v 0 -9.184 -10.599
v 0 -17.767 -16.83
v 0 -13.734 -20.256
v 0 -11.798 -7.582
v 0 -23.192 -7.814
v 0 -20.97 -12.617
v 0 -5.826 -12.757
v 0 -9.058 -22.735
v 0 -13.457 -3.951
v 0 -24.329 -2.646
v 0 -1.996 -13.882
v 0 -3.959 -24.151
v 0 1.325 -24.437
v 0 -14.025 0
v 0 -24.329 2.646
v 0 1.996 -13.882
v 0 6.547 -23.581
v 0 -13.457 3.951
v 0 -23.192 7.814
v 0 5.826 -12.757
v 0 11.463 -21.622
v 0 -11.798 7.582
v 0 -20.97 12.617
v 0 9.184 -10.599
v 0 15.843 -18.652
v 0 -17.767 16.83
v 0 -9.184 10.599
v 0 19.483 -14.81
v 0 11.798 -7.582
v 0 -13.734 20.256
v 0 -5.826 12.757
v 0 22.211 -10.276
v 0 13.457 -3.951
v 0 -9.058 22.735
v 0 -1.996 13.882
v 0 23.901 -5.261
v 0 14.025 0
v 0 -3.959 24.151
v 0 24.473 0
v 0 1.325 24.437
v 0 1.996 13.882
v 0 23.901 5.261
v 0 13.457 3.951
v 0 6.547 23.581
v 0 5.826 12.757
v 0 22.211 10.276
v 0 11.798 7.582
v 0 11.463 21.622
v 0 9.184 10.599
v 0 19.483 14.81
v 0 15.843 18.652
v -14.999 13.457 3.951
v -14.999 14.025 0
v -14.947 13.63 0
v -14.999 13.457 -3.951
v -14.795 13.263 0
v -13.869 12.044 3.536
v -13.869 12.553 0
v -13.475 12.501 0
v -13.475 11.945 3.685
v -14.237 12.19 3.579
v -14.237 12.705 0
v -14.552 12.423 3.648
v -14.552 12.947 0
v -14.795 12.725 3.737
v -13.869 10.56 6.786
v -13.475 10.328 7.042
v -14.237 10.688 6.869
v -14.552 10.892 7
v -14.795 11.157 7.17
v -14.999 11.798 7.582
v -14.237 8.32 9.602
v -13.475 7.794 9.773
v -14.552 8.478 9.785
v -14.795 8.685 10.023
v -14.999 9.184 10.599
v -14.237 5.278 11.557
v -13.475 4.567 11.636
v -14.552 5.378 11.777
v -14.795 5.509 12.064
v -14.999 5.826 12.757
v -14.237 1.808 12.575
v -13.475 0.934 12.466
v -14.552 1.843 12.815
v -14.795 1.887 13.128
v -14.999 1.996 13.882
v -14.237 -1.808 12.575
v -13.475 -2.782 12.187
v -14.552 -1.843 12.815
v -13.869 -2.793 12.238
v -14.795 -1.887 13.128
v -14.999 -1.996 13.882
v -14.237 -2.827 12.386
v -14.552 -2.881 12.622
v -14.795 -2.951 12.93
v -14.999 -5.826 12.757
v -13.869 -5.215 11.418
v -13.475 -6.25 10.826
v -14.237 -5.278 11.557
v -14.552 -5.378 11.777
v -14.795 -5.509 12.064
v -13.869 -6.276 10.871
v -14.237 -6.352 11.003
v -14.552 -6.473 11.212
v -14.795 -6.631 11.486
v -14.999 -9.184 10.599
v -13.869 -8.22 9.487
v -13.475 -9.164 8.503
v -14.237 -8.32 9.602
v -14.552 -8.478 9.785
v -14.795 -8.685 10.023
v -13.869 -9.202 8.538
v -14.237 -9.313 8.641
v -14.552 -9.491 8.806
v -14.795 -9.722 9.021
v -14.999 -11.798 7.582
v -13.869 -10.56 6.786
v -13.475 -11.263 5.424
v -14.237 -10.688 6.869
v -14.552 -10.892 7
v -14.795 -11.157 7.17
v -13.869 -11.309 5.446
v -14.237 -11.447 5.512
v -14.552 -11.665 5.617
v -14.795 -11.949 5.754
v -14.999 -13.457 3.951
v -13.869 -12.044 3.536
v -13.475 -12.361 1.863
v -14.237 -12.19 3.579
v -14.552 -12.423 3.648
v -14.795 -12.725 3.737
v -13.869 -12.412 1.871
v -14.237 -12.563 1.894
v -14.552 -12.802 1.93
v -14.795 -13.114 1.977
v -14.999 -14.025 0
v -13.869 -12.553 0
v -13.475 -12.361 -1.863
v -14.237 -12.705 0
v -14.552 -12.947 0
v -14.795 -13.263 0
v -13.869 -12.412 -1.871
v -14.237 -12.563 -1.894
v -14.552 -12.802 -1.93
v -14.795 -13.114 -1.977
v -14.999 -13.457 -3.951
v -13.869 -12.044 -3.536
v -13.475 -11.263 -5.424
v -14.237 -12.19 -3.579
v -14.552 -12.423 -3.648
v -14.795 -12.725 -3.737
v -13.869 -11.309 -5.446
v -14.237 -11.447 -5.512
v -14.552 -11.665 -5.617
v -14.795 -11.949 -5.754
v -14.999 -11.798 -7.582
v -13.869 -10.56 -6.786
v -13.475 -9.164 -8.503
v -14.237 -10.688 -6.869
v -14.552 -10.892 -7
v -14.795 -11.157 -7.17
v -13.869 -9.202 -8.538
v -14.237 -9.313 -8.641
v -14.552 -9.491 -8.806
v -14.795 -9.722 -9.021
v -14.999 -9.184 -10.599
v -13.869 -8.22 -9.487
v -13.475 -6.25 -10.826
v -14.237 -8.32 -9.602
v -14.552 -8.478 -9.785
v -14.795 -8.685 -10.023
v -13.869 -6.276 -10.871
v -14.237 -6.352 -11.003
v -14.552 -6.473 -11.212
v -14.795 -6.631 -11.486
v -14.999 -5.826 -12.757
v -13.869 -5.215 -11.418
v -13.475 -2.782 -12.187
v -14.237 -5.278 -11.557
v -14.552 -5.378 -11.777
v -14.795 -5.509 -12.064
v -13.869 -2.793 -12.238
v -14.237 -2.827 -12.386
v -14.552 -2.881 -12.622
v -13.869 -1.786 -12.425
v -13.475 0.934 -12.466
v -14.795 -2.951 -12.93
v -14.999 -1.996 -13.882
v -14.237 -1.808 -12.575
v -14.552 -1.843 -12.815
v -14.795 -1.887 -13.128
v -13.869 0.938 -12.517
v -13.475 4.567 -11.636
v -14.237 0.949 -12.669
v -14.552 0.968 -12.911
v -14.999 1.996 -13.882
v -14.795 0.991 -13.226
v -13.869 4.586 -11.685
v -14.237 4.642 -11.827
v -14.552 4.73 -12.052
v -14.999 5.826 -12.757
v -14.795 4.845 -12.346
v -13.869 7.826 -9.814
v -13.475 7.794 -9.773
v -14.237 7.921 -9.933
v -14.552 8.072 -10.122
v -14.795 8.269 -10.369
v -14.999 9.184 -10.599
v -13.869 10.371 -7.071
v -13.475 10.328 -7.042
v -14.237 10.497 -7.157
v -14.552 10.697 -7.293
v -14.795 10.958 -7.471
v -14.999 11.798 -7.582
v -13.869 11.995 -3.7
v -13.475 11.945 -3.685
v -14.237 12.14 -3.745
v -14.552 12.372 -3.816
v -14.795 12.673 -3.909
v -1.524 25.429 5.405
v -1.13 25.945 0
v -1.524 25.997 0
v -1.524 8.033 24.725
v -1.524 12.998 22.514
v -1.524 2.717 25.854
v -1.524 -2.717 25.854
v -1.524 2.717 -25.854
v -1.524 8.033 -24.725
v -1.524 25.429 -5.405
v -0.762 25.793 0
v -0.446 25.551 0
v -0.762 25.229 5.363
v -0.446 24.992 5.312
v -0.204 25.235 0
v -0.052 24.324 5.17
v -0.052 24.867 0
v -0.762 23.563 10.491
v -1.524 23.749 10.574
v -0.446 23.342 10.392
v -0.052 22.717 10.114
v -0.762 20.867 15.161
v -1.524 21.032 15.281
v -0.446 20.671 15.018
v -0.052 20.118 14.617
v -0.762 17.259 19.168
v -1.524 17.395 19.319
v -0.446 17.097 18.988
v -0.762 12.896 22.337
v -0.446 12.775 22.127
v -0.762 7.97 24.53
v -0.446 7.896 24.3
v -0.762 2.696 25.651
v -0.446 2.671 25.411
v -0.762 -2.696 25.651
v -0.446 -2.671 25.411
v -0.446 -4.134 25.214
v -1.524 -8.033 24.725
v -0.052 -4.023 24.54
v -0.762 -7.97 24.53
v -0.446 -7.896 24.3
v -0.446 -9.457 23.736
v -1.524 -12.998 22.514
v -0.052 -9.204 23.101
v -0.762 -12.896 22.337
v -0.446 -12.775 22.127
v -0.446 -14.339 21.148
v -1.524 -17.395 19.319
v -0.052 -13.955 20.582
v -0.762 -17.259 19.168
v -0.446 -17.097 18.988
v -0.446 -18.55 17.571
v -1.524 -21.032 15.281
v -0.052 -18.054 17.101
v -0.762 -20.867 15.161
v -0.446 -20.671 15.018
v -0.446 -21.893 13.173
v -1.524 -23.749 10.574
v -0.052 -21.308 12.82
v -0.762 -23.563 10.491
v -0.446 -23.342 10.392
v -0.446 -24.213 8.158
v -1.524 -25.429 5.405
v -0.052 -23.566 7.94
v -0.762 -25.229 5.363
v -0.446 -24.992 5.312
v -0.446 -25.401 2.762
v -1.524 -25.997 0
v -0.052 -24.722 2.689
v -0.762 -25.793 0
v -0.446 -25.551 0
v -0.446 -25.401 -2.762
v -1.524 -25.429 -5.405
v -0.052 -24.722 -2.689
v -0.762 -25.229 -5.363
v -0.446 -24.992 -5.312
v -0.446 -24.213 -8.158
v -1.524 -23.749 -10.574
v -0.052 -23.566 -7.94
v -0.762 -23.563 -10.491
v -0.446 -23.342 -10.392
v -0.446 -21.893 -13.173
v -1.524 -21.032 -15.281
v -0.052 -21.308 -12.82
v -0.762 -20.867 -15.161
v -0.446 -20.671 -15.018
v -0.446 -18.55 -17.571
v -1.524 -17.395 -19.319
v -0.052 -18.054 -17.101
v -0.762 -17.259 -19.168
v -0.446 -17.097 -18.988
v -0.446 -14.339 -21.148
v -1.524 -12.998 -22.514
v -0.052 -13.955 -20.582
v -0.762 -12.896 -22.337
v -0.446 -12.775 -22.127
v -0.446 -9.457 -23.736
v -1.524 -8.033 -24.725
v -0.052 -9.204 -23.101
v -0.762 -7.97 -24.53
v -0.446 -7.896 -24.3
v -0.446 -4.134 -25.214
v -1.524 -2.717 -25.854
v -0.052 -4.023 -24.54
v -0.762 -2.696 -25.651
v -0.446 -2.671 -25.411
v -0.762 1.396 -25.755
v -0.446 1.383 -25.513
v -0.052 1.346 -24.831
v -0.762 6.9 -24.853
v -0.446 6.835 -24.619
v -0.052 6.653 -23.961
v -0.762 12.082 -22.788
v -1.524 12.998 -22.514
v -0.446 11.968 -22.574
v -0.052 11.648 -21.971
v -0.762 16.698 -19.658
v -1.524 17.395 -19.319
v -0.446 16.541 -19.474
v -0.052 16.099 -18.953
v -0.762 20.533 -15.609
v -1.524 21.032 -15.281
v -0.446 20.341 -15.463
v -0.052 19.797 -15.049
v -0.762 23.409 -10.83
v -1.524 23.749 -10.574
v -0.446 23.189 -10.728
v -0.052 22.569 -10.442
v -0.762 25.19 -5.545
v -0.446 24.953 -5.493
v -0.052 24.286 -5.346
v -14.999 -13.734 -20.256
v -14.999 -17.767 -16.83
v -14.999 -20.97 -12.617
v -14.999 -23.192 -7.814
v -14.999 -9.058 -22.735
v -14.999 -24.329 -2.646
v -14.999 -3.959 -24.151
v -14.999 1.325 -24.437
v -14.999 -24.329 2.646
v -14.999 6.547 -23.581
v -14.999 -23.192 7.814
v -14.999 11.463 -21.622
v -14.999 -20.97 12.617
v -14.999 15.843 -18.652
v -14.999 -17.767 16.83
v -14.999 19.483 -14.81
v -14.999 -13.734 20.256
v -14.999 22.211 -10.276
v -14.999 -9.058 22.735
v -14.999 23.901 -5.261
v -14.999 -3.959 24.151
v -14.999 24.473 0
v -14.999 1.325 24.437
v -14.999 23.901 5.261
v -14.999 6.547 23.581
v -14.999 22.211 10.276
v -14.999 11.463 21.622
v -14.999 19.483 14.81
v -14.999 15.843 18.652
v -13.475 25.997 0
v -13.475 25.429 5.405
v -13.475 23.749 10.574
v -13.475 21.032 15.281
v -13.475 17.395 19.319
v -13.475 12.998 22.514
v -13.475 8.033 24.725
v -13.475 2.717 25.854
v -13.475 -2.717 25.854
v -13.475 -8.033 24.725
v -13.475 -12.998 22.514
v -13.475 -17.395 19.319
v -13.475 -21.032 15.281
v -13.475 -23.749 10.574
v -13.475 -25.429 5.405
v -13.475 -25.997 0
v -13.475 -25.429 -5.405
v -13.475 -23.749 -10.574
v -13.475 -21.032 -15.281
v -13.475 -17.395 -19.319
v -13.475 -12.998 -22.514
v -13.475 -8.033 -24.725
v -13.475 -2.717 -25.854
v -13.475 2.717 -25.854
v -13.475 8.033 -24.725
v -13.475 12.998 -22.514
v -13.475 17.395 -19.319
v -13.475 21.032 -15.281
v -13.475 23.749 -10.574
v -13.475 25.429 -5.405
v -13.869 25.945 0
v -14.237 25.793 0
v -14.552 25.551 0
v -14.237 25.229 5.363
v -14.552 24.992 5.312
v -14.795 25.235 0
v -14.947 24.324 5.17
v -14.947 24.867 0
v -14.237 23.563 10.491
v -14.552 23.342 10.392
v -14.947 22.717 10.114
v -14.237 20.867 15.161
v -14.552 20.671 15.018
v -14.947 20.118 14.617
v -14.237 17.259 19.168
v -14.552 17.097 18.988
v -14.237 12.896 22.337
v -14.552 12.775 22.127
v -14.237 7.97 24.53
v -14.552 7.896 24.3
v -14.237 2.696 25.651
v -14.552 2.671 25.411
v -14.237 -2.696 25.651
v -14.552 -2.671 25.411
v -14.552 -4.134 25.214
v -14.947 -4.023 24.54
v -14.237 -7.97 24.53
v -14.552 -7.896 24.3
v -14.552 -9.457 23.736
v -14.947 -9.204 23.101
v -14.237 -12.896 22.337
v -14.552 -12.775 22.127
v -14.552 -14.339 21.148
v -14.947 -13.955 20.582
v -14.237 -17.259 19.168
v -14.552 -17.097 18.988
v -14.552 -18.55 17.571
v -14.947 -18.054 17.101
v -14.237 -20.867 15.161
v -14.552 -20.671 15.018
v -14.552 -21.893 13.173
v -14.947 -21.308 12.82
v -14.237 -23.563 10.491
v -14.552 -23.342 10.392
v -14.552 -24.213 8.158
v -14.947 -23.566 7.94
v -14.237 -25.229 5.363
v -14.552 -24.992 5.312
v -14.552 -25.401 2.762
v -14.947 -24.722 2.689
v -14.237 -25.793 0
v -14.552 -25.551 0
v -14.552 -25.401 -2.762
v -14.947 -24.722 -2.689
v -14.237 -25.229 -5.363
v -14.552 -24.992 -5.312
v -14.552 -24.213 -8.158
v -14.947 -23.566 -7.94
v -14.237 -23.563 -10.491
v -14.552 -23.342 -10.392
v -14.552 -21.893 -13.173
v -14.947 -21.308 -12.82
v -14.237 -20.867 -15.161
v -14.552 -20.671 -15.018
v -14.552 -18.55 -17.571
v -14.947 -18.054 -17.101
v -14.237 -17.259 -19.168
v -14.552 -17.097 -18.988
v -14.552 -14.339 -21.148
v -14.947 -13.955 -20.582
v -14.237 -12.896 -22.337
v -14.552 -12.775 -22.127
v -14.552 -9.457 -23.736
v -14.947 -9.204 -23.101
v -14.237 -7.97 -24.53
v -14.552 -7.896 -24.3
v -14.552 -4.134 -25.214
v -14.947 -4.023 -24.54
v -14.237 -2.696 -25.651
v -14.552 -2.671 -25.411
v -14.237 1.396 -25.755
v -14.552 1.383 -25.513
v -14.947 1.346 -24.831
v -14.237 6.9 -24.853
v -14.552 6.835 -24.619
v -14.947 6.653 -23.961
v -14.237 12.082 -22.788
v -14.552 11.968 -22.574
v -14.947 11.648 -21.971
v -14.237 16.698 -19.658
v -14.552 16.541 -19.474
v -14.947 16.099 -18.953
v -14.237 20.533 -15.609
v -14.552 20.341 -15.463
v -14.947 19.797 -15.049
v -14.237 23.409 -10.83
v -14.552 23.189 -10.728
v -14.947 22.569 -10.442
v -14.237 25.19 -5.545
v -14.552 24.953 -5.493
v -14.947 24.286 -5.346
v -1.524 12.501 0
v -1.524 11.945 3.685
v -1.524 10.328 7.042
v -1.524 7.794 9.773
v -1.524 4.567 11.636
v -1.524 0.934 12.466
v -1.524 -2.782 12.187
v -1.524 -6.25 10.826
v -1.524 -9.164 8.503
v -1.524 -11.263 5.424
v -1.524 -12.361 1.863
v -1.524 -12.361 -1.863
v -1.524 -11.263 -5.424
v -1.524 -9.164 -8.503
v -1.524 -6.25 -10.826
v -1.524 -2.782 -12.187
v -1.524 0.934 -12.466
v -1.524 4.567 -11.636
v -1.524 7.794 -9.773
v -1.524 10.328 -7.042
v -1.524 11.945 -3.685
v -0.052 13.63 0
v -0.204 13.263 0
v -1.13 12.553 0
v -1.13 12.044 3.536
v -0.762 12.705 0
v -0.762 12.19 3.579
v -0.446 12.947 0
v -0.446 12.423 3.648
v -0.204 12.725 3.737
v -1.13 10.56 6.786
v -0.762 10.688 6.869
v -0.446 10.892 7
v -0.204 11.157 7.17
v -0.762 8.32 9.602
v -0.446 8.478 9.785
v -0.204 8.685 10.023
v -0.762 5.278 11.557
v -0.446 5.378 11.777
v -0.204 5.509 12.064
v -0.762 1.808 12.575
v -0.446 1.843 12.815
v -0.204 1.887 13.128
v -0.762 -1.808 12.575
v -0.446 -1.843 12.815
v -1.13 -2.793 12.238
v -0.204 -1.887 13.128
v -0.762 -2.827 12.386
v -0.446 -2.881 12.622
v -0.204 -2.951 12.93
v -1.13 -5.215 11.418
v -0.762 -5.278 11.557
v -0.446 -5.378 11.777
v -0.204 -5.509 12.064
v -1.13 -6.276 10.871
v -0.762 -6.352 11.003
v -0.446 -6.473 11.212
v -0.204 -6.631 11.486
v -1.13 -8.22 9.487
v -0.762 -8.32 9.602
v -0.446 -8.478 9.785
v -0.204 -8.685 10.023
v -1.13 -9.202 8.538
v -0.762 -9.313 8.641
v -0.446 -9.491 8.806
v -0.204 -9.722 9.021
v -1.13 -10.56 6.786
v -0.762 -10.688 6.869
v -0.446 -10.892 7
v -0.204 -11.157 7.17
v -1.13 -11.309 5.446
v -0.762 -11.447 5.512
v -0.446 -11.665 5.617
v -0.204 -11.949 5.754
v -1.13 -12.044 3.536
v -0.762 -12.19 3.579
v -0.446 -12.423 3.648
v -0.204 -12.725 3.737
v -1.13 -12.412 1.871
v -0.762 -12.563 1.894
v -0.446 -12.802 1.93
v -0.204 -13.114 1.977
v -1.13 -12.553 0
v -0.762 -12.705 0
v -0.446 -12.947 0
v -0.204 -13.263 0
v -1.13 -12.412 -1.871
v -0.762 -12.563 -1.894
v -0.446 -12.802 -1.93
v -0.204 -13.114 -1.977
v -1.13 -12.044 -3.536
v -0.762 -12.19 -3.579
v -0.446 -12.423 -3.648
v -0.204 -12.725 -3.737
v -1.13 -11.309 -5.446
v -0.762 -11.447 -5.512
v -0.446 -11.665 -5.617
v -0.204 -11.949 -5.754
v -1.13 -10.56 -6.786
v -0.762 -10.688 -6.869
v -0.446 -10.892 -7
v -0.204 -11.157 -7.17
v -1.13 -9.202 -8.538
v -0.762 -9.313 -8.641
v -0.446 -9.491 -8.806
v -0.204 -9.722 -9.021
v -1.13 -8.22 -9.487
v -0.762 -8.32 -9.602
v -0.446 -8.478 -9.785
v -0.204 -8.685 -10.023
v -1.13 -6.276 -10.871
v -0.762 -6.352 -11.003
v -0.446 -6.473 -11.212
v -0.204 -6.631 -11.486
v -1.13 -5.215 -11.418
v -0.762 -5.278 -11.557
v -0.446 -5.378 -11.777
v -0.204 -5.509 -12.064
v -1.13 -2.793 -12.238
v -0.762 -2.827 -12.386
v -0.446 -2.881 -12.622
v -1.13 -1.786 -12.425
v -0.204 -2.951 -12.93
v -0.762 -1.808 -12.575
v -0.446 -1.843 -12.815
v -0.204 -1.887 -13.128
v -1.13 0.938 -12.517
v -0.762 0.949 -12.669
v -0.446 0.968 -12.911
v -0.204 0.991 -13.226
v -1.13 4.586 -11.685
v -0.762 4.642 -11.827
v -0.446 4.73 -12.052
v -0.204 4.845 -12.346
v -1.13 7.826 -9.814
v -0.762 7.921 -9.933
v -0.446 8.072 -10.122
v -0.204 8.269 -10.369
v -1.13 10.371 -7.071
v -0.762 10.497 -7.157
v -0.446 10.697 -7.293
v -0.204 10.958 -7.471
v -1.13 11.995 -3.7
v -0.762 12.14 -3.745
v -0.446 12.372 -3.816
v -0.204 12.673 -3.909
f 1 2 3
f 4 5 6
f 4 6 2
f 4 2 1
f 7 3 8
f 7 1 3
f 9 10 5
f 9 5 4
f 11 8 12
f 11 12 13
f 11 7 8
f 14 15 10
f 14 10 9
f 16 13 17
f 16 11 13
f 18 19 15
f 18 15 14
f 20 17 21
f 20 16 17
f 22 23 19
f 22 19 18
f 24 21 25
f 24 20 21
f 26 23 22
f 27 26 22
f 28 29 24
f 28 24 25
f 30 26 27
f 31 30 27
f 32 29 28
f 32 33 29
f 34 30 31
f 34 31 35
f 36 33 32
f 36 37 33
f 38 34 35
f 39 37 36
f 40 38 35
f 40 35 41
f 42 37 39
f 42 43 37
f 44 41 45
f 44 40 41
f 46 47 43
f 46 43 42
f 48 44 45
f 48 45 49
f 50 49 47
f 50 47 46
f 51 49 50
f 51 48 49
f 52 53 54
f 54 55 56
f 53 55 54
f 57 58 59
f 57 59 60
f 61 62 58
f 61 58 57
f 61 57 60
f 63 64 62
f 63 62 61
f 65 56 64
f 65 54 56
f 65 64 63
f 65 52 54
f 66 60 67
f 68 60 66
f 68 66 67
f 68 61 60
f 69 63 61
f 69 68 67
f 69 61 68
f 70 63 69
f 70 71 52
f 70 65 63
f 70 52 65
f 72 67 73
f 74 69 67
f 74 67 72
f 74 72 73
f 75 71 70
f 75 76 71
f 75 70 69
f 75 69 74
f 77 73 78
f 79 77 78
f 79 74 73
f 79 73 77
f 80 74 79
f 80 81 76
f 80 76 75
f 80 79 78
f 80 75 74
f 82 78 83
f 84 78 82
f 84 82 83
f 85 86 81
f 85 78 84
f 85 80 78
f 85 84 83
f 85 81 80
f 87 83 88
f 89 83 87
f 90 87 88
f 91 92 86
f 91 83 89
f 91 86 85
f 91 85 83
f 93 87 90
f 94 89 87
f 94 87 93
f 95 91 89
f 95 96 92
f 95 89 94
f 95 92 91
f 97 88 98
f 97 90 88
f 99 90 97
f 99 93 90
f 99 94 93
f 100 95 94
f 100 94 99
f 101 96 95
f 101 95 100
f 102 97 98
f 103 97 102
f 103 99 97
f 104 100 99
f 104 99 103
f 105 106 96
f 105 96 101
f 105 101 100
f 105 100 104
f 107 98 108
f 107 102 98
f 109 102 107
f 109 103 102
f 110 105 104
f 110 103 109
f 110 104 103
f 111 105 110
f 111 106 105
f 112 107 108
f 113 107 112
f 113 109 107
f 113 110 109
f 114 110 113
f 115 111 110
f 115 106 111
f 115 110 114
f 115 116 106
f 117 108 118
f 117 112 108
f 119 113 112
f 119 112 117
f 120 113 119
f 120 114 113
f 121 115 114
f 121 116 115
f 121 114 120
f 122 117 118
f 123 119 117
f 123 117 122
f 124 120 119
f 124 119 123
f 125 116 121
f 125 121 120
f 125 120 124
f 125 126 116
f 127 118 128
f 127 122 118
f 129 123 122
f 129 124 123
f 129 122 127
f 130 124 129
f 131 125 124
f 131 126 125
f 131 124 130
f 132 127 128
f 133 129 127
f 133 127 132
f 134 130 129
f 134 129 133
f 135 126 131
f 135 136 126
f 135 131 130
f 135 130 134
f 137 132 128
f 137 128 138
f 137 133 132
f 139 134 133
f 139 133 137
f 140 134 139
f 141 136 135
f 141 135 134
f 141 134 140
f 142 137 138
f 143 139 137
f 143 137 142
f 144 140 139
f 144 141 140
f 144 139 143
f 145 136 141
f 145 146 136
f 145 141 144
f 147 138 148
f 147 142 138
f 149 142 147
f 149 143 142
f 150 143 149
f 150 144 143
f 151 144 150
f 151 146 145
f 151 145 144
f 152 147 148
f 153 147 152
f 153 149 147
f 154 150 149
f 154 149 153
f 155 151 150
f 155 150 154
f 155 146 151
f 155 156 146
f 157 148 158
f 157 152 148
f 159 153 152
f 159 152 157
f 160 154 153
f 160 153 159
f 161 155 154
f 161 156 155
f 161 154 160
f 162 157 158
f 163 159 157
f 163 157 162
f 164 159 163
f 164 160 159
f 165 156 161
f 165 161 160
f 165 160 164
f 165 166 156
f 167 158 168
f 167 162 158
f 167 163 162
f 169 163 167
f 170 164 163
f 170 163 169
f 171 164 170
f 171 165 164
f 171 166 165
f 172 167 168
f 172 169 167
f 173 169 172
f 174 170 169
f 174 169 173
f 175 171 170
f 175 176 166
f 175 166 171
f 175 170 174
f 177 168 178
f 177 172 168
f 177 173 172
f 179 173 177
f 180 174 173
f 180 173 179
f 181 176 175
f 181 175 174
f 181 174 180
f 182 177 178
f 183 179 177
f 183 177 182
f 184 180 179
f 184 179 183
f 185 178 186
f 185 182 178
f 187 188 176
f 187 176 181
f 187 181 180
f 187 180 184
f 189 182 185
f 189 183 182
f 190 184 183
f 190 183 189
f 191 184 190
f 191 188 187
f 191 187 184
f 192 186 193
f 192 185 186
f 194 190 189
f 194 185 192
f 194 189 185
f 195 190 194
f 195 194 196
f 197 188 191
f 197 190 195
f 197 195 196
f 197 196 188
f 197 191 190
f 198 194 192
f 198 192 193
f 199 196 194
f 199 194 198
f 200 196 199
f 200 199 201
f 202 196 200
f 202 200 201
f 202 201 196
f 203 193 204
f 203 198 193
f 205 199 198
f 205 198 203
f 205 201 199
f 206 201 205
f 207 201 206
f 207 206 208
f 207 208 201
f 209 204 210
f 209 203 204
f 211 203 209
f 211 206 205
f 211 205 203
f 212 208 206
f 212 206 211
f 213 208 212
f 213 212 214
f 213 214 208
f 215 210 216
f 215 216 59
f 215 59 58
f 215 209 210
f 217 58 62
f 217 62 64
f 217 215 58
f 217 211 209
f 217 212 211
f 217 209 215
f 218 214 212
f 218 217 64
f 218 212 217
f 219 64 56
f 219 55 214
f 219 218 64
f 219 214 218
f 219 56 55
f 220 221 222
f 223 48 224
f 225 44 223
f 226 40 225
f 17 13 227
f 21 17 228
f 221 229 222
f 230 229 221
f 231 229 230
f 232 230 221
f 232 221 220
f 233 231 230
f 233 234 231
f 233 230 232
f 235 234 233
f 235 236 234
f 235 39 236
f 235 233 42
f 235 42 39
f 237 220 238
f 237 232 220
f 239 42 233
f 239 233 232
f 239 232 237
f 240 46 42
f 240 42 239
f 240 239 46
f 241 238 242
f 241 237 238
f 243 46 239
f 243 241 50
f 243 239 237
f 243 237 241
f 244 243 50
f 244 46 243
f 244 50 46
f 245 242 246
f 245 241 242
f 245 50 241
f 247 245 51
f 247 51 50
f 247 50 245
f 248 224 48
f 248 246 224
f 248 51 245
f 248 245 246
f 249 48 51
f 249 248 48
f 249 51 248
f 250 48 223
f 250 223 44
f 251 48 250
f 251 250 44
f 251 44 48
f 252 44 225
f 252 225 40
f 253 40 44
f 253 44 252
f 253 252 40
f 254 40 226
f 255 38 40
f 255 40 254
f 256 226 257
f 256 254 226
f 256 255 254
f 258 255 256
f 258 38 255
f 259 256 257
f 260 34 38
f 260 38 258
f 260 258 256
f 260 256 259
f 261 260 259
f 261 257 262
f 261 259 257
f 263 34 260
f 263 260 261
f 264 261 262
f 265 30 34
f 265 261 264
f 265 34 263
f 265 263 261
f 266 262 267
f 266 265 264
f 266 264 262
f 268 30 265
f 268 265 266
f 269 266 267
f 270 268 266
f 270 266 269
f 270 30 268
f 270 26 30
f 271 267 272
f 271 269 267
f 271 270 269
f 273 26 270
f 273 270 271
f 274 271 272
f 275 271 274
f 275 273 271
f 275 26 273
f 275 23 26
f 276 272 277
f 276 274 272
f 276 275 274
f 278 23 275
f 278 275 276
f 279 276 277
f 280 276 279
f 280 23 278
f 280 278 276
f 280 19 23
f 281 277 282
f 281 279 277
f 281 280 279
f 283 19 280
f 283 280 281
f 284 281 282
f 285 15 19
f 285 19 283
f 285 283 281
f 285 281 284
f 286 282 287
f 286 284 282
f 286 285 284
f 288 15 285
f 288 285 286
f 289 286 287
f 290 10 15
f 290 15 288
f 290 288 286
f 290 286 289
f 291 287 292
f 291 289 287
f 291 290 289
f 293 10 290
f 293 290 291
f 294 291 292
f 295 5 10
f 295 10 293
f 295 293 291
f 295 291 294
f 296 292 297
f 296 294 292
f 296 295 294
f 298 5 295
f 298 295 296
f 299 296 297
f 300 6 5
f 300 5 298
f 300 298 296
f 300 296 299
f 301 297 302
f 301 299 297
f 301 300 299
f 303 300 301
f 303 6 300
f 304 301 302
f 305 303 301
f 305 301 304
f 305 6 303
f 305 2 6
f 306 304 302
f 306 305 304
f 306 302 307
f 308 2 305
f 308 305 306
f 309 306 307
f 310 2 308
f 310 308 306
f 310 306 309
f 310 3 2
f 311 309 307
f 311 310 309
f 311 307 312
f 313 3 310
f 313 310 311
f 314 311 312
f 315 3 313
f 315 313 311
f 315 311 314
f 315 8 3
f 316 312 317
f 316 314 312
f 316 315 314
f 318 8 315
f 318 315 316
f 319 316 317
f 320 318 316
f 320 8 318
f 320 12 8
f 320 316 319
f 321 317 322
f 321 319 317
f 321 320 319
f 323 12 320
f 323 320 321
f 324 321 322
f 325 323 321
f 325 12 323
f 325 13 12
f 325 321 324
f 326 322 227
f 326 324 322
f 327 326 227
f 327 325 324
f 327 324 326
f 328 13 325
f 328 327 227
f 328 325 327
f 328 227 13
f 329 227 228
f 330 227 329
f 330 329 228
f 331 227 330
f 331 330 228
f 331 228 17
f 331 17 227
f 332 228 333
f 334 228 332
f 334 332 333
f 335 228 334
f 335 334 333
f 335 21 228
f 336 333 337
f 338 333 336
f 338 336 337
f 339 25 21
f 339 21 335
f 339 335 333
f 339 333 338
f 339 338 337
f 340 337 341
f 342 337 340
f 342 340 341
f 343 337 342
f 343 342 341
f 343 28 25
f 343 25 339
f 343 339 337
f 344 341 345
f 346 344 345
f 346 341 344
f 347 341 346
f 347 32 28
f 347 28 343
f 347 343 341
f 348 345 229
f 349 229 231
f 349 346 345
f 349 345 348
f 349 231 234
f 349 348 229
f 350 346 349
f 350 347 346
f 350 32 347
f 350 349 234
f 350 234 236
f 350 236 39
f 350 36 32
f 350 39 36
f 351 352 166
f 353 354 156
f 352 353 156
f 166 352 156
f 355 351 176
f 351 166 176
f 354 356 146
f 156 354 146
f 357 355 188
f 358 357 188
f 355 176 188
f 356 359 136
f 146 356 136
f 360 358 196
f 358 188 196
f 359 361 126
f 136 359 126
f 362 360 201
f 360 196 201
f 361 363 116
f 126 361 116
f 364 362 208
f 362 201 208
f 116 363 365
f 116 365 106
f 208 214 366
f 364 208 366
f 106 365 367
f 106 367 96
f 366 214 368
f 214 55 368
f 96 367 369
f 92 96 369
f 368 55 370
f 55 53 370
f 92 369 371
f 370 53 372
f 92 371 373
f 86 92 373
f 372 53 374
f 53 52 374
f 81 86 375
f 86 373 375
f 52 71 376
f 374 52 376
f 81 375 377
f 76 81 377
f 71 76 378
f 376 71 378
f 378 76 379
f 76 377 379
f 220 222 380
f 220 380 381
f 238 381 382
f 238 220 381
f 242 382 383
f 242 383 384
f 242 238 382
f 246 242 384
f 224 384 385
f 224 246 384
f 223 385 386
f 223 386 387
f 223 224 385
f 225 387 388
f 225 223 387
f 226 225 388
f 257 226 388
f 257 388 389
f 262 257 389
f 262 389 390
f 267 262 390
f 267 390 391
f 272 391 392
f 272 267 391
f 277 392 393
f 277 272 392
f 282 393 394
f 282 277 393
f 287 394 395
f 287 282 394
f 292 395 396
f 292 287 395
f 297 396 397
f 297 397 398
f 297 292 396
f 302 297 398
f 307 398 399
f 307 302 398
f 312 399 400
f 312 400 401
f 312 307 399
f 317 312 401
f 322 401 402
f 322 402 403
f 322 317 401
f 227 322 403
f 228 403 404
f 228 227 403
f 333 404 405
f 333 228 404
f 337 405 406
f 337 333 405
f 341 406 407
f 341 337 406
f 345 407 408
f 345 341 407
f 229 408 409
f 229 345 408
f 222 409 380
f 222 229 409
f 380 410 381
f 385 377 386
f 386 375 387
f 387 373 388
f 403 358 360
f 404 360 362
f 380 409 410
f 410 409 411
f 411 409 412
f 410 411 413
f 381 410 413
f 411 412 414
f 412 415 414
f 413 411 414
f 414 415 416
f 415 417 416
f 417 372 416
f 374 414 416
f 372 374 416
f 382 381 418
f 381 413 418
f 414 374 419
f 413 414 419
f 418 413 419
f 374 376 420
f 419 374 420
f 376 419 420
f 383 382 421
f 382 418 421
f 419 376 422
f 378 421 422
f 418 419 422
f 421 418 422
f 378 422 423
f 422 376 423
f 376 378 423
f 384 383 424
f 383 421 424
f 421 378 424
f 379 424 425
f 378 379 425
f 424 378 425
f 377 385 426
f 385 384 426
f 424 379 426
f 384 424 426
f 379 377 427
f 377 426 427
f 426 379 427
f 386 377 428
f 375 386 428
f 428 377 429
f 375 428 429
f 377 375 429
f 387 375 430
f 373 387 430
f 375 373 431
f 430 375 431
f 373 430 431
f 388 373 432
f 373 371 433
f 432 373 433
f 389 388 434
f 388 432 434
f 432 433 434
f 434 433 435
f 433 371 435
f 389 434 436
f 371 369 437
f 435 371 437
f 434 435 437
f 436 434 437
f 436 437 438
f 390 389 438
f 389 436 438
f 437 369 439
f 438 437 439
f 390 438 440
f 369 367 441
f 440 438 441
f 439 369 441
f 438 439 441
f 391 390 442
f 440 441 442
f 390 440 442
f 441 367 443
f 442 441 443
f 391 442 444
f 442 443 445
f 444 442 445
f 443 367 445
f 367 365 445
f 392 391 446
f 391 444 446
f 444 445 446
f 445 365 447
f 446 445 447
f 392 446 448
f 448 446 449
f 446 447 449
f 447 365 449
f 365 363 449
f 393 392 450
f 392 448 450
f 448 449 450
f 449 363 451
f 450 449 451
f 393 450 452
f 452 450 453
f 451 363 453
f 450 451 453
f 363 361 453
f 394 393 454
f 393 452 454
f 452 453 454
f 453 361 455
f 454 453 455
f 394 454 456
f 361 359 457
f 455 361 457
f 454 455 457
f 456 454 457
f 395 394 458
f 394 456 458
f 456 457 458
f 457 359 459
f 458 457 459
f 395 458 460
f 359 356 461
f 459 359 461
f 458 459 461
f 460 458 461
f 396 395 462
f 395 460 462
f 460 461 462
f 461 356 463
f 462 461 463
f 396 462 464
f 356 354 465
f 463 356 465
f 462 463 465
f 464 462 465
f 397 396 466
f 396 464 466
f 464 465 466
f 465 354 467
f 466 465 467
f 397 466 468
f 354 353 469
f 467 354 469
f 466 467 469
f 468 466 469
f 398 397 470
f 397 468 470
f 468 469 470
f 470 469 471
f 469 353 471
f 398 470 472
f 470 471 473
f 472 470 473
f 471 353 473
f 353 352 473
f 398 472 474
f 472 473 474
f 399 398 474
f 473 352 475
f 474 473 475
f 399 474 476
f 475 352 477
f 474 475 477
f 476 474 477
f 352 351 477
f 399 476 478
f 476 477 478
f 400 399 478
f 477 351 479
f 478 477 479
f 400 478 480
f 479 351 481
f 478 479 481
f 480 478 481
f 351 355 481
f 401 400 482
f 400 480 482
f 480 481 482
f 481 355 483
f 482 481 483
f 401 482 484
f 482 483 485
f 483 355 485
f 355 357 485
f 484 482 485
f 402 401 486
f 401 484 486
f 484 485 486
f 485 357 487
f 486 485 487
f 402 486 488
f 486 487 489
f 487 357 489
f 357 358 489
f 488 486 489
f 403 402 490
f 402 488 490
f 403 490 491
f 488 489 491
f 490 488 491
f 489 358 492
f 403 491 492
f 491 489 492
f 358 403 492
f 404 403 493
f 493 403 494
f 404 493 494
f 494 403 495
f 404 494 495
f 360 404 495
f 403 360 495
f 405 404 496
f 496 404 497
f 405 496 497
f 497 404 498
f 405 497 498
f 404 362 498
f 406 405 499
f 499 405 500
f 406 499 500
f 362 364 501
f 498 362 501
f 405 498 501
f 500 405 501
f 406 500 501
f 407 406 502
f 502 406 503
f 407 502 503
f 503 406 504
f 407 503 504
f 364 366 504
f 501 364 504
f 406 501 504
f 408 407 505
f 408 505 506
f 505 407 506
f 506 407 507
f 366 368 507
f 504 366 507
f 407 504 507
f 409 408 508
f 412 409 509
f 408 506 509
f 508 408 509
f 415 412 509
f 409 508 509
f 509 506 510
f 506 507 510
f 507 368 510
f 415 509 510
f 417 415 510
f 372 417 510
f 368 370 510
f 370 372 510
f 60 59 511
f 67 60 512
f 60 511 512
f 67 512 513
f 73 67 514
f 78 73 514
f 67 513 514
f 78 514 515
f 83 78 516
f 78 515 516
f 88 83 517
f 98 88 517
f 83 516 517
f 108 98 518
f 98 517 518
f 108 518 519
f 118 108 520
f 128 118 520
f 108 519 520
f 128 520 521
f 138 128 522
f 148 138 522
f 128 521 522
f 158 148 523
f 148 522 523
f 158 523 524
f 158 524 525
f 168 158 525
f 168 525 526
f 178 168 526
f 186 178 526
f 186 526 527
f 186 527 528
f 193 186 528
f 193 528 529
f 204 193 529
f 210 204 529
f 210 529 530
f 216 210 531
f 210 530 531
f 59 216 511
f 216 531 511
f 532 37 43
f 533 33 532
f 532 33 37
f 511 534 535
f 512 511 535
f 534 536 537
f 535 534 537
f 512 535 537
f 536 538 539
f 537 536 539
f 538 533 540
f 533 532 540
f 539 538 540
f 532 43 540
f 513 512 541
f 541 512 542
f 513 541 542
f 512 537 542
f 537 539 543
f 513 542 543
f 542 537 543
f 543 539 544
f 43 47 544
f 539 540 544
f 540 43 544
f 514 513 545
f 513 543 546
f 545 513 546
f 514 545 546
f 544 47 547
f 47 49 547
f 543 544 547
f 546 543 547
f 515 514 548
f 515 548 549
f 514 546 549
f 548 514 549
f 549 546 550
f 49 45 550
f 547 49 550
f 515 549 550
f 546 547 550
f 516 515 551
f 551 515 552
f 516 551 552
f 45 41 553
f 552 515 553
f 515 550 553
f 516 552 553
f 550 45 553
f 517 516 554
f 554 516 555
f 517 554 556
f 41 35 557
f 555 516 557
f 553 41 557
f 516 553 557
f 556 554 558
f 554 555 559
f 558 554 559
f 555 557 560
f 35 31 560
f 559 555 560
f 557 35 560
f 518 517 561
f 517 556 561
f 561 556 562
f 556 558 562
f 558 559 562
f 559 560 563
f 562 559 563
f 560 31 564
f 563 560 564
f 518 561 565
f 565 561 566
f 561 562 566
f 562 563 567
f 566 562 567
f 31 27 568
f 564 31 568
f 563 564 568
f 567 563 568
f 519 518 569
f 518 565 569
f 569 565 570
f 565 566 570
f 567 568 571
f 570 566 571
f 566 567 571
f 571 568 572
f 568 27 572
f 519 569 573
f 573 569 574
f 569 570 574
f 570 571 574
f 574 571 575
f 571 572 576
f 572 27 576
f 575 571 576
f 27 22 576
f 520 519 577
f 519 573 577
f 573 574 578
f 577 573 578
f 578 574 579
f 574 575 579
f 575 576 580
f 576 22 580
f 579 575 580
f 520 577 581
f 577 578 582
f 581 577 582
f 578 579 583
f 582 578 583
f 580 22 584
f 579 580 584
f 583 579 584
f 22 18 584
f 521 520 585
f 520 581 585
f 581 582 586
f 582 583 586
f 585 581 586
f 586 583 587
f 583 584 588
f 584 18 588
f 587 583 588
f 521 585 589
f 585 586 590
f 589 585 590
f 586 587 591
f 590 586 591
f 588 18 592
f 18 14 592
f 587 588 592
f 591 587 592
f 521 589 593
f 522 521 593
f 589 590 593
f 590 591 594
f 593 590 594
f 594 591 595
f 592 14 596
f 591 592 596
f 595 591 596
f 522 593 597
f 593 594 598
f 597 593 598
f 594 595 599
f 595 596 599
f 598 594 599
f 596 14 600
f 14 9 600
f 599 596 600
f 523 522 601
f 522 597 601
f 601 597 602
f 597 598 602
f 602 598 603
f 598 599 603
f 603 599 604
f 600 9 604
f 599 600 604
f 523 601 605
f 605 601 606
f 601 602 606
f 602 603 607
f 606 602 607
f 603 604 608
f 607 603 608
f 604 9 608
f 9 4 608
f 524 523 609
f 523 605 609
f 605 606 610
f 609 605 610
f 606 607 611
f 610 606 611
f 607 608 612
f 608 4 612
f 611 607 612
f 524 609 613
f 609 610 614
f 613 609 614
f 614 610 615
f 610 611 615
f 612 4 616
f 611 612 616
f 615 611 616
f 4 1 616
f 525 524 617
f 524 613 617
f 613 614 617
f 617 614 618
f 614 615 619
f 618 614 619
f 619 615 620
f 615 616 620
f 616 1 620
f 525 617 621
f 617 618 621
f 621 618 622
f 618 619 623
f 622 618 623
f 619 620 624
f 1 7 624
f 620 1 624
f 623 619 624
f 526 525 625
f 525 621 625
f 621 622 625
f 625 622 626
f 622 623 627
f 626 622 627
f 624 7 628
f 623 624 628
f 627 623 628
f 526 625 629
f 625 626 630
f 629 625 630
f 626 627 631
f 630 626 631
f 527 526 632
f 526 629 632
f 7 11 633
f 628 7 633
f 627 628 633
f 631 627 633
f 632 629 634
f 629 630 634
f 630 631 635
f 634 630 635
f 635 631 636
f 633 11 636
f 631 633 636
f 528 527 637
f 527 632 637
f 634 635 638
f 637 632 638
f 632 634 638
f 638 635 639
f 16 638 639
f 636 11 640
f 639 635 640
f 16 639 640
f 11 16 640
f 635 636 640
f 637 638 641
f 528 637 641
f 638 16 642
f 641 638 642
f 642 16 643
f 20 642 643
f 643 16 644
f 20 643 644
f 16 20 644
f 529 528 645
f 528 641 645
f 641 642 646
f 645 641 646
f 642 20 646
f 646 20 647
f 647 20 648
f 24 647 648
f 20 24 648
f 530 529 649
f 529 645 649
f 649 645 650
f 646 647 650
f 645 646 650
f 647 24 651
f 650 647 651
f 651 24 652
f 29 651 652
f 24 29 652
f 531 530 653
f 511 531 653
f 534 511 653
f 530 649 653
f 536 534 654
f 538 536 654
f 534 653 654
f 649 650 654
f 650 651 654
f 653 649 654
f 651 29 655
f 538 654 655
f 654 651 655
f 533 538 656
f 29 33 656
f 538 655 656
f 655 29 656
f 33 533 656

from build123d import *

# Parameters (mm, degrees)
F0_R     = 25.9969
F0_R_2   = 12.50061
F1_DEPTH = 14.9987
F2_R     = 1.524


with BuildPart() as f1:
    # F0 (on Right) → F1 (new body)
    with BuildSketch(Plane.YZ):
        Circle(F0_R)
        Circle(F0_R_2, mode=Mode.SUBTRACT)
    extrude(amount=-F1_DEPTH)

    # F2
    f2_edges = [f1.edges().sort_by_distance(p)[0] for p in [
        (0, -25.9969, 0),
        (0, -12.50061, 0),
        (-14.9987, -25.9969, 0),
        (-14.9987, -12.50061, 0),
    ]]
    fillet(f2_edges, radius=F2_R)


solid = f1.part
